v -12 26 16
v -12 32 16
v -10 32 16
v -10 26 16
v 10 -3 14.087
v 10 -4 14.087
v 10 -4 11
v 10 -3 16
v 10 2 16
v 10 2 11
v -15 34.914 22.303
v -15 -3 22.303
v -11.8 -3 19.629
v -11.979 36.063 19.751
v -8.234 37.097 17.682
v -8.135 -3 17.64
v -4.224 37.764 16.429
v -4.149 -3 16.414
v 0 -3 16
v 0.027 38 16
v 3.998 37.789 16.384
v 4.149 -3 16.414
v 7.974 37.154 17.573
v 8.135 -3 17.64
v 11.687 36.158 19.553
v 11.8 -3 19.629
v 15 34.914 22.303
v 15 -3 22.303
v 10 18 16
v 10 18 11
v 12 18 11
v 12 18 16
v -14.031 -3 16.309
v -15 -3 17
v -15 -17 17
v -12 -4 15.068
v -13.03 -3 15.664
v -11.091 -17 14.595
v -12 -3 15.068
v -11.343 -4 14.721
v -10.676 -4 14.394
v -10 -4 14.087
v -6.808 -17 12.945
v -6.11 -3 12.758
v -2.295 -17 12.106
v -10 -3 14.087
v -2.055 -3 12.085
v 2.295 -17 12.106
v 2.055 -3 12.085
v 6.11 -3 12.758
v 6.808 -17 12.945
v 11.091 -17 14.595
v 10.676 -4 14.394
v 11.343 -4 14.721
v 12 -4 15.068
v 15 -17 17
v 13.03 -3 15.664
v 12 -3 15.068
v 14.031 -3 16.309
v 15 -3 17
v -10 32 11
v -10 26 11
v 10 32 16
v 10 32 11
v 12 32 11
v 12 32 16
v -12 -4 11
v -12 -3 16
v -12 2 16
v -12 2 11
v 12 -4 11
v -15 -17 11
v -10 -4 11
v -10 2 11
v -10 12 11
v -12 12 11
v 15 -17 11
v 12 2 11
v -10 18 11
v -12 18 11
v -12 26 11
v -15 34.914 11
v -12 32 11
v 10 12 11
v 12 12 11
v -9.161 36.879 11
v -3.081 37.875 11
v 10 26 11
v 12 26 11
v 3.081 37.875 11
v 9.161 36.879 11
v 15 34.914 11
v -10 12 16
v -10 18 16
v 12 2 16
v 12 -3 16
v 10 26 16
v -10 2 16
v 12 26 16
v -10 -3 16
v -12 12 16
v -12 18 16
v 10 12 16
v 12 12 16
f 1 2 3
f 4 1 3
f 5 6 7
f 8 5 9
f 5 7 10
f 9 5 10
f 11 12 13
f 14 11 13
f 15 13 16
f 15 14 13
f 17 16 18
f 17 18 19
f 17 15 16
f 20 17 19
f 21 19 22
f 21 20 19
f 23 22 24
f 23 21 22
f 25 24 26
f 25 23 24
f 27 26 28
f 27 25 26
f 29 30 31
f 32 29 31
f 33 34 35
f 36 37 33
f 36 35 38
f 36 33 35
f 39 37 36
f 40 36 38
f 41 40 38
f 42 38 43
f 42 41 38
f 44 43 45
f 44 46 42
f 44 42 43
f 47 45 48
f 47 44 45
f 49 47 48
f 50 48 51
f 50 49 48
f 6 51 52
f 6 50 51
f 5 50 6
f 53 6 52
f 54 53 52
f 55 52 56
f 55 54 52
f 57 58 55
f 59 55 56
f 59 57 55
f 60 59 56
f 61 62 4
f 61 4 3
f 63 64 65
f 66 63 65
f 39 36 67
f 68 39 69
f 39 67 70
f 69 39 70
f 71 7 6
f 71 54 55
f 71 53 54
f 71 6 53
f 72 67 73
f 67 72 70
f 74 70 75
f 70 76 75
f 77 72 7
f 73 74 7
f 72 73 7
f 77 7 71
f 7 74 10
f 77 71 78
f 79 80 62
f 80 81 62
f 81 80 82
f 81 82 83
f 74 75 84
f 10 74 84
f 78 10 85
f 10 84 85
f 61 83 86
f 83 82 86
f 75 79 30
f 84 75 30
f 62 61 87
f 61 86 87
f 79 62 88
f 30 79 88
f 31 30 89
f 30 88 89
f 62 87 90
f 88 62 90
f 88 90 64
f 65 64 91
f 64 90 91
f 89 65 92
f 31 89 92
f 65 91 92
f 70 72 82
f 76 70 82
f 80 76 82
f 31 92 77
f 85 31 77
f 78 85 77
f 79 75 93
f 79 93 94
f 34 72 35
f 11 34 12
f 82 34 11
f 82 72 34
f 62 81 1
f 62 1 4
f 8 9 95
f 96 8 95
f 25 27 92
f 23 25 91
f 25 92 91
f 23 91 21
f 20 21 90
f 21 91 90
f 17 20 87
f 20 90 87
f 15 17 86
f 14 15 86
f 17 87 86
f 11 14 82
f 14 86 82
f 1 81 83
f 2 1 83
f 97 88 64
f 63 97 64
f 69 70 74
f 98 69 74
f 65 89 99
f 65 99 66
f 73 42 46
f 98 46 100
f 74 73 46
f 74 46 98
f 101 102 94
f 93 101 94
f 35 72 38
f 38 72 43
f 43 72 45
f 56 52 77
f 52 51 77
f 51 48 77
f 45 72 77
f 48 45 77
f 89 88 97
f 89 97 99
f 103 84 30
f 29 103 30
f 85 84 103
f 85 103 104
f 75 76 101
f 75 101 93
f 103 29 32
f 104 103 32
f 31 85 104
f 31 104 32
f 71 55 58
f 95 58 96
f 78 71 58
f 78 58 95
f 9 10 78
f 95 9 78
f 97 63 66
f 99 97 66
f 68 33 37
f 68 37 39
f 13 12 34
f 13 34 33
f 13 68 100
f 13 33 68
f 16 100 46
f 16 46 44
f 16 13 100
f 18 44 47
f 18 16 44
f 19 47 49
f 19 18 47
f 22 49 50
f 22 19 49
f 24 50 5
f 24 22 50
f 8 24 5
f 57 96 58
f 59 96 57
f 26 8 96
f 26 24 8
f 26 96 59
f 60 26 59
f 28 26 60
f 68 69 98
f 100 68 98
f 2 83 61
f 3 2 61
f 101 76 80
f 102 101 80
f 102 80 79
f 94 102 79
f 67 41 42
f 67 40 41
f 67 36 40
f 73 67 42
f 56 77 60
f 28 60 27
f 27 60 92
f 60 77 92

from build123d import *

# Parameters (mm, degrees)
CYLINDER2790_R     = 38
CYLINDER2790_DEPTH = 30
BOX969_W           = 2
BOX969_H           = 6
BOX969_DEPTH       = 6
BOX970_W           = 2
BOX970_H           = 6
BOX970_DEPTH       = 6
BOX971_W           = 2
BOX971_H           = 6
BOX971_DEPTH       = 6
BOX972_W           = 2
BOX972_H           = 6
BOX972_DEPTH       = 6
BOX973_W           = 2
BOX973_H           = 6
BOX973_DEPTH       = 6
BOX968_W           = 2
BOX968_H           = 6
BOX968_DEPTH       = 6
TUBE123_R          = 21
TUBE123_R_2        = 2
TUBE123_DEPTH      = 64
TUBE124_R          = 25
TUBE124_R_2        = 2
TUBE124_DEPTH      = 26
BOX891_W           = 30
BOX891_H           = 64
BOX891_DEPTH       = 18


with BuildPart() as v_lec2760:
    # Cylinder2790 → Cylinder2790 (new body)
    with BuildSketch(Plane.XY):
        Circle(CYLINDER2790_R)
    extrude(amount=CYLINDER2790_DEPTH)


with BuildPart() as krychle968:
    # Box969 → Box969 (new body)
    with BuildSketch(Plane(origin=(-12, -4, 10), x_dir=(1, 0, 0), z_dir=(0, 0, 1))):
        with Locations((1, 3)):
            Rectangle(BOX969_W, BOX969_H)
    extrude(amount=BOX969_DEPTH)


with BuildPart() as krychle969:
    # Box970 → Box970 (new body)
    with BuildSketch(Plane(origin=(10, 26, 10), x_dir=(1, 0, 0), z_dir=(0, 0, 1))):
        with Locations((1, 3)):
            Rectangle(BOX970_W, BOX970_H)
    extrude(amount=BOX970_DEPTH)


with BuildPart() as krychle970:
    # Box971 → Box971 (new body)
    with BuildSketch(Plane(origin=(-12, 26, 10), x_dir=(1, 0, 0), z_dir=(0, 0, 1))):
        with Locations((1, 3)):
            Rectangle(BOX971_W, BOX971_H)
    extrude(amount=BOX971_DEPTH)


with BuildPart() as krychle971:
    # Box972 → Box972 (new body)
    with BuildSketch(Plane(origin=(10, 12, 10), x_dir=(1, 0, 0), z_dir=(0, 0, 1))):
        with Locations((1, 3)):
            Rectangle(BOX972_W, BOX972_H)
    extrude(amount=BOX972_DEPTH)


with BuildPart() as krychle972:
    # Box973 → Box973 (new body)
    with BuildSketch(Plane(origin=(-12, 12, 10), x_dir=(1, 0, 0), z_dir=(0, 0, 1))):
        with Locations((1, 3)):
            Rectangle(BOX973_W, BOX973_H)
    extrude(amount=BOX973_DEPTH)


with BuildPart() as compound1242:
    # Box968 → Box968 (new body)
    with BuildSketch(Plane(origin=(10, -4, 10), x_dir=(1, 0, 0), z_dir=(0, 0, 1))):
        with Locations((1, 3)):
            Rectangle(BOX968_W, BOX968_H)
    extrude(amount=BOX968_DEPTH)

    # Compound1242: union Krychle968, Krychle969, Krychle970, Krychle971, Krychle972
    add(krychle968.part)
    add(krychle969.part)
    add(krychle970.part)
    add(krychle971.part)
    add(krychle972.part)


with BuildPart() as tube123:
    # Tube123 → Tube123 (new body)
    with BuildSketch(Plane(origin=(0, 61, 37), x_dir=(1, 0, 0), z_dir=(0, -1, 0))):
        Circle(TUBE123_R)
        Circle(TUBE123_R_2, mode=Mode.SUBTRACT)
    extrude(amount=TUBE123_DEPTH)


with BuildPart() as tube124:
    # Tube124 → Tube124 (new body)
    with BuildSketch(Plane(origin=(0, -3, 37), x_dir=(1, 0, 0), z_dir=(0, -1, 0))):
        Circle(TUBE124_R)
        Circle(TUBE124_R_2, mode=Mode.SUBTRACT)
    extrude(amount=TUBE124_DEPTH)


with BuildPart() as common:
    # Box891 → Box891 (new body)
    with BuildSketch(Plane(origin=(-15, -17, 11), x_dir=(1, 0, 0), z_dir=(0, 0, 1))):
        with Locations((15, 32)):
            Rectangle(BOX891_W, BOX891_H)
    extrude(amount=BOX891_DEPTH)

    # Cut977: cut Tube124
    add(tube124.part, mode=Mode.SUBTRACT)

    # Cut001: cut Tube123
    add(tube123.part, mode=Mode.SUBTRACT)

    # Cut1048: cut Compound1242
    add(compound1242.part, mode=Mode.SUBTRACT)

    # Common: intersect Válec2760
    add(v_lec2760.part, mode=Mode.INTERSECT)


solid = common.part
